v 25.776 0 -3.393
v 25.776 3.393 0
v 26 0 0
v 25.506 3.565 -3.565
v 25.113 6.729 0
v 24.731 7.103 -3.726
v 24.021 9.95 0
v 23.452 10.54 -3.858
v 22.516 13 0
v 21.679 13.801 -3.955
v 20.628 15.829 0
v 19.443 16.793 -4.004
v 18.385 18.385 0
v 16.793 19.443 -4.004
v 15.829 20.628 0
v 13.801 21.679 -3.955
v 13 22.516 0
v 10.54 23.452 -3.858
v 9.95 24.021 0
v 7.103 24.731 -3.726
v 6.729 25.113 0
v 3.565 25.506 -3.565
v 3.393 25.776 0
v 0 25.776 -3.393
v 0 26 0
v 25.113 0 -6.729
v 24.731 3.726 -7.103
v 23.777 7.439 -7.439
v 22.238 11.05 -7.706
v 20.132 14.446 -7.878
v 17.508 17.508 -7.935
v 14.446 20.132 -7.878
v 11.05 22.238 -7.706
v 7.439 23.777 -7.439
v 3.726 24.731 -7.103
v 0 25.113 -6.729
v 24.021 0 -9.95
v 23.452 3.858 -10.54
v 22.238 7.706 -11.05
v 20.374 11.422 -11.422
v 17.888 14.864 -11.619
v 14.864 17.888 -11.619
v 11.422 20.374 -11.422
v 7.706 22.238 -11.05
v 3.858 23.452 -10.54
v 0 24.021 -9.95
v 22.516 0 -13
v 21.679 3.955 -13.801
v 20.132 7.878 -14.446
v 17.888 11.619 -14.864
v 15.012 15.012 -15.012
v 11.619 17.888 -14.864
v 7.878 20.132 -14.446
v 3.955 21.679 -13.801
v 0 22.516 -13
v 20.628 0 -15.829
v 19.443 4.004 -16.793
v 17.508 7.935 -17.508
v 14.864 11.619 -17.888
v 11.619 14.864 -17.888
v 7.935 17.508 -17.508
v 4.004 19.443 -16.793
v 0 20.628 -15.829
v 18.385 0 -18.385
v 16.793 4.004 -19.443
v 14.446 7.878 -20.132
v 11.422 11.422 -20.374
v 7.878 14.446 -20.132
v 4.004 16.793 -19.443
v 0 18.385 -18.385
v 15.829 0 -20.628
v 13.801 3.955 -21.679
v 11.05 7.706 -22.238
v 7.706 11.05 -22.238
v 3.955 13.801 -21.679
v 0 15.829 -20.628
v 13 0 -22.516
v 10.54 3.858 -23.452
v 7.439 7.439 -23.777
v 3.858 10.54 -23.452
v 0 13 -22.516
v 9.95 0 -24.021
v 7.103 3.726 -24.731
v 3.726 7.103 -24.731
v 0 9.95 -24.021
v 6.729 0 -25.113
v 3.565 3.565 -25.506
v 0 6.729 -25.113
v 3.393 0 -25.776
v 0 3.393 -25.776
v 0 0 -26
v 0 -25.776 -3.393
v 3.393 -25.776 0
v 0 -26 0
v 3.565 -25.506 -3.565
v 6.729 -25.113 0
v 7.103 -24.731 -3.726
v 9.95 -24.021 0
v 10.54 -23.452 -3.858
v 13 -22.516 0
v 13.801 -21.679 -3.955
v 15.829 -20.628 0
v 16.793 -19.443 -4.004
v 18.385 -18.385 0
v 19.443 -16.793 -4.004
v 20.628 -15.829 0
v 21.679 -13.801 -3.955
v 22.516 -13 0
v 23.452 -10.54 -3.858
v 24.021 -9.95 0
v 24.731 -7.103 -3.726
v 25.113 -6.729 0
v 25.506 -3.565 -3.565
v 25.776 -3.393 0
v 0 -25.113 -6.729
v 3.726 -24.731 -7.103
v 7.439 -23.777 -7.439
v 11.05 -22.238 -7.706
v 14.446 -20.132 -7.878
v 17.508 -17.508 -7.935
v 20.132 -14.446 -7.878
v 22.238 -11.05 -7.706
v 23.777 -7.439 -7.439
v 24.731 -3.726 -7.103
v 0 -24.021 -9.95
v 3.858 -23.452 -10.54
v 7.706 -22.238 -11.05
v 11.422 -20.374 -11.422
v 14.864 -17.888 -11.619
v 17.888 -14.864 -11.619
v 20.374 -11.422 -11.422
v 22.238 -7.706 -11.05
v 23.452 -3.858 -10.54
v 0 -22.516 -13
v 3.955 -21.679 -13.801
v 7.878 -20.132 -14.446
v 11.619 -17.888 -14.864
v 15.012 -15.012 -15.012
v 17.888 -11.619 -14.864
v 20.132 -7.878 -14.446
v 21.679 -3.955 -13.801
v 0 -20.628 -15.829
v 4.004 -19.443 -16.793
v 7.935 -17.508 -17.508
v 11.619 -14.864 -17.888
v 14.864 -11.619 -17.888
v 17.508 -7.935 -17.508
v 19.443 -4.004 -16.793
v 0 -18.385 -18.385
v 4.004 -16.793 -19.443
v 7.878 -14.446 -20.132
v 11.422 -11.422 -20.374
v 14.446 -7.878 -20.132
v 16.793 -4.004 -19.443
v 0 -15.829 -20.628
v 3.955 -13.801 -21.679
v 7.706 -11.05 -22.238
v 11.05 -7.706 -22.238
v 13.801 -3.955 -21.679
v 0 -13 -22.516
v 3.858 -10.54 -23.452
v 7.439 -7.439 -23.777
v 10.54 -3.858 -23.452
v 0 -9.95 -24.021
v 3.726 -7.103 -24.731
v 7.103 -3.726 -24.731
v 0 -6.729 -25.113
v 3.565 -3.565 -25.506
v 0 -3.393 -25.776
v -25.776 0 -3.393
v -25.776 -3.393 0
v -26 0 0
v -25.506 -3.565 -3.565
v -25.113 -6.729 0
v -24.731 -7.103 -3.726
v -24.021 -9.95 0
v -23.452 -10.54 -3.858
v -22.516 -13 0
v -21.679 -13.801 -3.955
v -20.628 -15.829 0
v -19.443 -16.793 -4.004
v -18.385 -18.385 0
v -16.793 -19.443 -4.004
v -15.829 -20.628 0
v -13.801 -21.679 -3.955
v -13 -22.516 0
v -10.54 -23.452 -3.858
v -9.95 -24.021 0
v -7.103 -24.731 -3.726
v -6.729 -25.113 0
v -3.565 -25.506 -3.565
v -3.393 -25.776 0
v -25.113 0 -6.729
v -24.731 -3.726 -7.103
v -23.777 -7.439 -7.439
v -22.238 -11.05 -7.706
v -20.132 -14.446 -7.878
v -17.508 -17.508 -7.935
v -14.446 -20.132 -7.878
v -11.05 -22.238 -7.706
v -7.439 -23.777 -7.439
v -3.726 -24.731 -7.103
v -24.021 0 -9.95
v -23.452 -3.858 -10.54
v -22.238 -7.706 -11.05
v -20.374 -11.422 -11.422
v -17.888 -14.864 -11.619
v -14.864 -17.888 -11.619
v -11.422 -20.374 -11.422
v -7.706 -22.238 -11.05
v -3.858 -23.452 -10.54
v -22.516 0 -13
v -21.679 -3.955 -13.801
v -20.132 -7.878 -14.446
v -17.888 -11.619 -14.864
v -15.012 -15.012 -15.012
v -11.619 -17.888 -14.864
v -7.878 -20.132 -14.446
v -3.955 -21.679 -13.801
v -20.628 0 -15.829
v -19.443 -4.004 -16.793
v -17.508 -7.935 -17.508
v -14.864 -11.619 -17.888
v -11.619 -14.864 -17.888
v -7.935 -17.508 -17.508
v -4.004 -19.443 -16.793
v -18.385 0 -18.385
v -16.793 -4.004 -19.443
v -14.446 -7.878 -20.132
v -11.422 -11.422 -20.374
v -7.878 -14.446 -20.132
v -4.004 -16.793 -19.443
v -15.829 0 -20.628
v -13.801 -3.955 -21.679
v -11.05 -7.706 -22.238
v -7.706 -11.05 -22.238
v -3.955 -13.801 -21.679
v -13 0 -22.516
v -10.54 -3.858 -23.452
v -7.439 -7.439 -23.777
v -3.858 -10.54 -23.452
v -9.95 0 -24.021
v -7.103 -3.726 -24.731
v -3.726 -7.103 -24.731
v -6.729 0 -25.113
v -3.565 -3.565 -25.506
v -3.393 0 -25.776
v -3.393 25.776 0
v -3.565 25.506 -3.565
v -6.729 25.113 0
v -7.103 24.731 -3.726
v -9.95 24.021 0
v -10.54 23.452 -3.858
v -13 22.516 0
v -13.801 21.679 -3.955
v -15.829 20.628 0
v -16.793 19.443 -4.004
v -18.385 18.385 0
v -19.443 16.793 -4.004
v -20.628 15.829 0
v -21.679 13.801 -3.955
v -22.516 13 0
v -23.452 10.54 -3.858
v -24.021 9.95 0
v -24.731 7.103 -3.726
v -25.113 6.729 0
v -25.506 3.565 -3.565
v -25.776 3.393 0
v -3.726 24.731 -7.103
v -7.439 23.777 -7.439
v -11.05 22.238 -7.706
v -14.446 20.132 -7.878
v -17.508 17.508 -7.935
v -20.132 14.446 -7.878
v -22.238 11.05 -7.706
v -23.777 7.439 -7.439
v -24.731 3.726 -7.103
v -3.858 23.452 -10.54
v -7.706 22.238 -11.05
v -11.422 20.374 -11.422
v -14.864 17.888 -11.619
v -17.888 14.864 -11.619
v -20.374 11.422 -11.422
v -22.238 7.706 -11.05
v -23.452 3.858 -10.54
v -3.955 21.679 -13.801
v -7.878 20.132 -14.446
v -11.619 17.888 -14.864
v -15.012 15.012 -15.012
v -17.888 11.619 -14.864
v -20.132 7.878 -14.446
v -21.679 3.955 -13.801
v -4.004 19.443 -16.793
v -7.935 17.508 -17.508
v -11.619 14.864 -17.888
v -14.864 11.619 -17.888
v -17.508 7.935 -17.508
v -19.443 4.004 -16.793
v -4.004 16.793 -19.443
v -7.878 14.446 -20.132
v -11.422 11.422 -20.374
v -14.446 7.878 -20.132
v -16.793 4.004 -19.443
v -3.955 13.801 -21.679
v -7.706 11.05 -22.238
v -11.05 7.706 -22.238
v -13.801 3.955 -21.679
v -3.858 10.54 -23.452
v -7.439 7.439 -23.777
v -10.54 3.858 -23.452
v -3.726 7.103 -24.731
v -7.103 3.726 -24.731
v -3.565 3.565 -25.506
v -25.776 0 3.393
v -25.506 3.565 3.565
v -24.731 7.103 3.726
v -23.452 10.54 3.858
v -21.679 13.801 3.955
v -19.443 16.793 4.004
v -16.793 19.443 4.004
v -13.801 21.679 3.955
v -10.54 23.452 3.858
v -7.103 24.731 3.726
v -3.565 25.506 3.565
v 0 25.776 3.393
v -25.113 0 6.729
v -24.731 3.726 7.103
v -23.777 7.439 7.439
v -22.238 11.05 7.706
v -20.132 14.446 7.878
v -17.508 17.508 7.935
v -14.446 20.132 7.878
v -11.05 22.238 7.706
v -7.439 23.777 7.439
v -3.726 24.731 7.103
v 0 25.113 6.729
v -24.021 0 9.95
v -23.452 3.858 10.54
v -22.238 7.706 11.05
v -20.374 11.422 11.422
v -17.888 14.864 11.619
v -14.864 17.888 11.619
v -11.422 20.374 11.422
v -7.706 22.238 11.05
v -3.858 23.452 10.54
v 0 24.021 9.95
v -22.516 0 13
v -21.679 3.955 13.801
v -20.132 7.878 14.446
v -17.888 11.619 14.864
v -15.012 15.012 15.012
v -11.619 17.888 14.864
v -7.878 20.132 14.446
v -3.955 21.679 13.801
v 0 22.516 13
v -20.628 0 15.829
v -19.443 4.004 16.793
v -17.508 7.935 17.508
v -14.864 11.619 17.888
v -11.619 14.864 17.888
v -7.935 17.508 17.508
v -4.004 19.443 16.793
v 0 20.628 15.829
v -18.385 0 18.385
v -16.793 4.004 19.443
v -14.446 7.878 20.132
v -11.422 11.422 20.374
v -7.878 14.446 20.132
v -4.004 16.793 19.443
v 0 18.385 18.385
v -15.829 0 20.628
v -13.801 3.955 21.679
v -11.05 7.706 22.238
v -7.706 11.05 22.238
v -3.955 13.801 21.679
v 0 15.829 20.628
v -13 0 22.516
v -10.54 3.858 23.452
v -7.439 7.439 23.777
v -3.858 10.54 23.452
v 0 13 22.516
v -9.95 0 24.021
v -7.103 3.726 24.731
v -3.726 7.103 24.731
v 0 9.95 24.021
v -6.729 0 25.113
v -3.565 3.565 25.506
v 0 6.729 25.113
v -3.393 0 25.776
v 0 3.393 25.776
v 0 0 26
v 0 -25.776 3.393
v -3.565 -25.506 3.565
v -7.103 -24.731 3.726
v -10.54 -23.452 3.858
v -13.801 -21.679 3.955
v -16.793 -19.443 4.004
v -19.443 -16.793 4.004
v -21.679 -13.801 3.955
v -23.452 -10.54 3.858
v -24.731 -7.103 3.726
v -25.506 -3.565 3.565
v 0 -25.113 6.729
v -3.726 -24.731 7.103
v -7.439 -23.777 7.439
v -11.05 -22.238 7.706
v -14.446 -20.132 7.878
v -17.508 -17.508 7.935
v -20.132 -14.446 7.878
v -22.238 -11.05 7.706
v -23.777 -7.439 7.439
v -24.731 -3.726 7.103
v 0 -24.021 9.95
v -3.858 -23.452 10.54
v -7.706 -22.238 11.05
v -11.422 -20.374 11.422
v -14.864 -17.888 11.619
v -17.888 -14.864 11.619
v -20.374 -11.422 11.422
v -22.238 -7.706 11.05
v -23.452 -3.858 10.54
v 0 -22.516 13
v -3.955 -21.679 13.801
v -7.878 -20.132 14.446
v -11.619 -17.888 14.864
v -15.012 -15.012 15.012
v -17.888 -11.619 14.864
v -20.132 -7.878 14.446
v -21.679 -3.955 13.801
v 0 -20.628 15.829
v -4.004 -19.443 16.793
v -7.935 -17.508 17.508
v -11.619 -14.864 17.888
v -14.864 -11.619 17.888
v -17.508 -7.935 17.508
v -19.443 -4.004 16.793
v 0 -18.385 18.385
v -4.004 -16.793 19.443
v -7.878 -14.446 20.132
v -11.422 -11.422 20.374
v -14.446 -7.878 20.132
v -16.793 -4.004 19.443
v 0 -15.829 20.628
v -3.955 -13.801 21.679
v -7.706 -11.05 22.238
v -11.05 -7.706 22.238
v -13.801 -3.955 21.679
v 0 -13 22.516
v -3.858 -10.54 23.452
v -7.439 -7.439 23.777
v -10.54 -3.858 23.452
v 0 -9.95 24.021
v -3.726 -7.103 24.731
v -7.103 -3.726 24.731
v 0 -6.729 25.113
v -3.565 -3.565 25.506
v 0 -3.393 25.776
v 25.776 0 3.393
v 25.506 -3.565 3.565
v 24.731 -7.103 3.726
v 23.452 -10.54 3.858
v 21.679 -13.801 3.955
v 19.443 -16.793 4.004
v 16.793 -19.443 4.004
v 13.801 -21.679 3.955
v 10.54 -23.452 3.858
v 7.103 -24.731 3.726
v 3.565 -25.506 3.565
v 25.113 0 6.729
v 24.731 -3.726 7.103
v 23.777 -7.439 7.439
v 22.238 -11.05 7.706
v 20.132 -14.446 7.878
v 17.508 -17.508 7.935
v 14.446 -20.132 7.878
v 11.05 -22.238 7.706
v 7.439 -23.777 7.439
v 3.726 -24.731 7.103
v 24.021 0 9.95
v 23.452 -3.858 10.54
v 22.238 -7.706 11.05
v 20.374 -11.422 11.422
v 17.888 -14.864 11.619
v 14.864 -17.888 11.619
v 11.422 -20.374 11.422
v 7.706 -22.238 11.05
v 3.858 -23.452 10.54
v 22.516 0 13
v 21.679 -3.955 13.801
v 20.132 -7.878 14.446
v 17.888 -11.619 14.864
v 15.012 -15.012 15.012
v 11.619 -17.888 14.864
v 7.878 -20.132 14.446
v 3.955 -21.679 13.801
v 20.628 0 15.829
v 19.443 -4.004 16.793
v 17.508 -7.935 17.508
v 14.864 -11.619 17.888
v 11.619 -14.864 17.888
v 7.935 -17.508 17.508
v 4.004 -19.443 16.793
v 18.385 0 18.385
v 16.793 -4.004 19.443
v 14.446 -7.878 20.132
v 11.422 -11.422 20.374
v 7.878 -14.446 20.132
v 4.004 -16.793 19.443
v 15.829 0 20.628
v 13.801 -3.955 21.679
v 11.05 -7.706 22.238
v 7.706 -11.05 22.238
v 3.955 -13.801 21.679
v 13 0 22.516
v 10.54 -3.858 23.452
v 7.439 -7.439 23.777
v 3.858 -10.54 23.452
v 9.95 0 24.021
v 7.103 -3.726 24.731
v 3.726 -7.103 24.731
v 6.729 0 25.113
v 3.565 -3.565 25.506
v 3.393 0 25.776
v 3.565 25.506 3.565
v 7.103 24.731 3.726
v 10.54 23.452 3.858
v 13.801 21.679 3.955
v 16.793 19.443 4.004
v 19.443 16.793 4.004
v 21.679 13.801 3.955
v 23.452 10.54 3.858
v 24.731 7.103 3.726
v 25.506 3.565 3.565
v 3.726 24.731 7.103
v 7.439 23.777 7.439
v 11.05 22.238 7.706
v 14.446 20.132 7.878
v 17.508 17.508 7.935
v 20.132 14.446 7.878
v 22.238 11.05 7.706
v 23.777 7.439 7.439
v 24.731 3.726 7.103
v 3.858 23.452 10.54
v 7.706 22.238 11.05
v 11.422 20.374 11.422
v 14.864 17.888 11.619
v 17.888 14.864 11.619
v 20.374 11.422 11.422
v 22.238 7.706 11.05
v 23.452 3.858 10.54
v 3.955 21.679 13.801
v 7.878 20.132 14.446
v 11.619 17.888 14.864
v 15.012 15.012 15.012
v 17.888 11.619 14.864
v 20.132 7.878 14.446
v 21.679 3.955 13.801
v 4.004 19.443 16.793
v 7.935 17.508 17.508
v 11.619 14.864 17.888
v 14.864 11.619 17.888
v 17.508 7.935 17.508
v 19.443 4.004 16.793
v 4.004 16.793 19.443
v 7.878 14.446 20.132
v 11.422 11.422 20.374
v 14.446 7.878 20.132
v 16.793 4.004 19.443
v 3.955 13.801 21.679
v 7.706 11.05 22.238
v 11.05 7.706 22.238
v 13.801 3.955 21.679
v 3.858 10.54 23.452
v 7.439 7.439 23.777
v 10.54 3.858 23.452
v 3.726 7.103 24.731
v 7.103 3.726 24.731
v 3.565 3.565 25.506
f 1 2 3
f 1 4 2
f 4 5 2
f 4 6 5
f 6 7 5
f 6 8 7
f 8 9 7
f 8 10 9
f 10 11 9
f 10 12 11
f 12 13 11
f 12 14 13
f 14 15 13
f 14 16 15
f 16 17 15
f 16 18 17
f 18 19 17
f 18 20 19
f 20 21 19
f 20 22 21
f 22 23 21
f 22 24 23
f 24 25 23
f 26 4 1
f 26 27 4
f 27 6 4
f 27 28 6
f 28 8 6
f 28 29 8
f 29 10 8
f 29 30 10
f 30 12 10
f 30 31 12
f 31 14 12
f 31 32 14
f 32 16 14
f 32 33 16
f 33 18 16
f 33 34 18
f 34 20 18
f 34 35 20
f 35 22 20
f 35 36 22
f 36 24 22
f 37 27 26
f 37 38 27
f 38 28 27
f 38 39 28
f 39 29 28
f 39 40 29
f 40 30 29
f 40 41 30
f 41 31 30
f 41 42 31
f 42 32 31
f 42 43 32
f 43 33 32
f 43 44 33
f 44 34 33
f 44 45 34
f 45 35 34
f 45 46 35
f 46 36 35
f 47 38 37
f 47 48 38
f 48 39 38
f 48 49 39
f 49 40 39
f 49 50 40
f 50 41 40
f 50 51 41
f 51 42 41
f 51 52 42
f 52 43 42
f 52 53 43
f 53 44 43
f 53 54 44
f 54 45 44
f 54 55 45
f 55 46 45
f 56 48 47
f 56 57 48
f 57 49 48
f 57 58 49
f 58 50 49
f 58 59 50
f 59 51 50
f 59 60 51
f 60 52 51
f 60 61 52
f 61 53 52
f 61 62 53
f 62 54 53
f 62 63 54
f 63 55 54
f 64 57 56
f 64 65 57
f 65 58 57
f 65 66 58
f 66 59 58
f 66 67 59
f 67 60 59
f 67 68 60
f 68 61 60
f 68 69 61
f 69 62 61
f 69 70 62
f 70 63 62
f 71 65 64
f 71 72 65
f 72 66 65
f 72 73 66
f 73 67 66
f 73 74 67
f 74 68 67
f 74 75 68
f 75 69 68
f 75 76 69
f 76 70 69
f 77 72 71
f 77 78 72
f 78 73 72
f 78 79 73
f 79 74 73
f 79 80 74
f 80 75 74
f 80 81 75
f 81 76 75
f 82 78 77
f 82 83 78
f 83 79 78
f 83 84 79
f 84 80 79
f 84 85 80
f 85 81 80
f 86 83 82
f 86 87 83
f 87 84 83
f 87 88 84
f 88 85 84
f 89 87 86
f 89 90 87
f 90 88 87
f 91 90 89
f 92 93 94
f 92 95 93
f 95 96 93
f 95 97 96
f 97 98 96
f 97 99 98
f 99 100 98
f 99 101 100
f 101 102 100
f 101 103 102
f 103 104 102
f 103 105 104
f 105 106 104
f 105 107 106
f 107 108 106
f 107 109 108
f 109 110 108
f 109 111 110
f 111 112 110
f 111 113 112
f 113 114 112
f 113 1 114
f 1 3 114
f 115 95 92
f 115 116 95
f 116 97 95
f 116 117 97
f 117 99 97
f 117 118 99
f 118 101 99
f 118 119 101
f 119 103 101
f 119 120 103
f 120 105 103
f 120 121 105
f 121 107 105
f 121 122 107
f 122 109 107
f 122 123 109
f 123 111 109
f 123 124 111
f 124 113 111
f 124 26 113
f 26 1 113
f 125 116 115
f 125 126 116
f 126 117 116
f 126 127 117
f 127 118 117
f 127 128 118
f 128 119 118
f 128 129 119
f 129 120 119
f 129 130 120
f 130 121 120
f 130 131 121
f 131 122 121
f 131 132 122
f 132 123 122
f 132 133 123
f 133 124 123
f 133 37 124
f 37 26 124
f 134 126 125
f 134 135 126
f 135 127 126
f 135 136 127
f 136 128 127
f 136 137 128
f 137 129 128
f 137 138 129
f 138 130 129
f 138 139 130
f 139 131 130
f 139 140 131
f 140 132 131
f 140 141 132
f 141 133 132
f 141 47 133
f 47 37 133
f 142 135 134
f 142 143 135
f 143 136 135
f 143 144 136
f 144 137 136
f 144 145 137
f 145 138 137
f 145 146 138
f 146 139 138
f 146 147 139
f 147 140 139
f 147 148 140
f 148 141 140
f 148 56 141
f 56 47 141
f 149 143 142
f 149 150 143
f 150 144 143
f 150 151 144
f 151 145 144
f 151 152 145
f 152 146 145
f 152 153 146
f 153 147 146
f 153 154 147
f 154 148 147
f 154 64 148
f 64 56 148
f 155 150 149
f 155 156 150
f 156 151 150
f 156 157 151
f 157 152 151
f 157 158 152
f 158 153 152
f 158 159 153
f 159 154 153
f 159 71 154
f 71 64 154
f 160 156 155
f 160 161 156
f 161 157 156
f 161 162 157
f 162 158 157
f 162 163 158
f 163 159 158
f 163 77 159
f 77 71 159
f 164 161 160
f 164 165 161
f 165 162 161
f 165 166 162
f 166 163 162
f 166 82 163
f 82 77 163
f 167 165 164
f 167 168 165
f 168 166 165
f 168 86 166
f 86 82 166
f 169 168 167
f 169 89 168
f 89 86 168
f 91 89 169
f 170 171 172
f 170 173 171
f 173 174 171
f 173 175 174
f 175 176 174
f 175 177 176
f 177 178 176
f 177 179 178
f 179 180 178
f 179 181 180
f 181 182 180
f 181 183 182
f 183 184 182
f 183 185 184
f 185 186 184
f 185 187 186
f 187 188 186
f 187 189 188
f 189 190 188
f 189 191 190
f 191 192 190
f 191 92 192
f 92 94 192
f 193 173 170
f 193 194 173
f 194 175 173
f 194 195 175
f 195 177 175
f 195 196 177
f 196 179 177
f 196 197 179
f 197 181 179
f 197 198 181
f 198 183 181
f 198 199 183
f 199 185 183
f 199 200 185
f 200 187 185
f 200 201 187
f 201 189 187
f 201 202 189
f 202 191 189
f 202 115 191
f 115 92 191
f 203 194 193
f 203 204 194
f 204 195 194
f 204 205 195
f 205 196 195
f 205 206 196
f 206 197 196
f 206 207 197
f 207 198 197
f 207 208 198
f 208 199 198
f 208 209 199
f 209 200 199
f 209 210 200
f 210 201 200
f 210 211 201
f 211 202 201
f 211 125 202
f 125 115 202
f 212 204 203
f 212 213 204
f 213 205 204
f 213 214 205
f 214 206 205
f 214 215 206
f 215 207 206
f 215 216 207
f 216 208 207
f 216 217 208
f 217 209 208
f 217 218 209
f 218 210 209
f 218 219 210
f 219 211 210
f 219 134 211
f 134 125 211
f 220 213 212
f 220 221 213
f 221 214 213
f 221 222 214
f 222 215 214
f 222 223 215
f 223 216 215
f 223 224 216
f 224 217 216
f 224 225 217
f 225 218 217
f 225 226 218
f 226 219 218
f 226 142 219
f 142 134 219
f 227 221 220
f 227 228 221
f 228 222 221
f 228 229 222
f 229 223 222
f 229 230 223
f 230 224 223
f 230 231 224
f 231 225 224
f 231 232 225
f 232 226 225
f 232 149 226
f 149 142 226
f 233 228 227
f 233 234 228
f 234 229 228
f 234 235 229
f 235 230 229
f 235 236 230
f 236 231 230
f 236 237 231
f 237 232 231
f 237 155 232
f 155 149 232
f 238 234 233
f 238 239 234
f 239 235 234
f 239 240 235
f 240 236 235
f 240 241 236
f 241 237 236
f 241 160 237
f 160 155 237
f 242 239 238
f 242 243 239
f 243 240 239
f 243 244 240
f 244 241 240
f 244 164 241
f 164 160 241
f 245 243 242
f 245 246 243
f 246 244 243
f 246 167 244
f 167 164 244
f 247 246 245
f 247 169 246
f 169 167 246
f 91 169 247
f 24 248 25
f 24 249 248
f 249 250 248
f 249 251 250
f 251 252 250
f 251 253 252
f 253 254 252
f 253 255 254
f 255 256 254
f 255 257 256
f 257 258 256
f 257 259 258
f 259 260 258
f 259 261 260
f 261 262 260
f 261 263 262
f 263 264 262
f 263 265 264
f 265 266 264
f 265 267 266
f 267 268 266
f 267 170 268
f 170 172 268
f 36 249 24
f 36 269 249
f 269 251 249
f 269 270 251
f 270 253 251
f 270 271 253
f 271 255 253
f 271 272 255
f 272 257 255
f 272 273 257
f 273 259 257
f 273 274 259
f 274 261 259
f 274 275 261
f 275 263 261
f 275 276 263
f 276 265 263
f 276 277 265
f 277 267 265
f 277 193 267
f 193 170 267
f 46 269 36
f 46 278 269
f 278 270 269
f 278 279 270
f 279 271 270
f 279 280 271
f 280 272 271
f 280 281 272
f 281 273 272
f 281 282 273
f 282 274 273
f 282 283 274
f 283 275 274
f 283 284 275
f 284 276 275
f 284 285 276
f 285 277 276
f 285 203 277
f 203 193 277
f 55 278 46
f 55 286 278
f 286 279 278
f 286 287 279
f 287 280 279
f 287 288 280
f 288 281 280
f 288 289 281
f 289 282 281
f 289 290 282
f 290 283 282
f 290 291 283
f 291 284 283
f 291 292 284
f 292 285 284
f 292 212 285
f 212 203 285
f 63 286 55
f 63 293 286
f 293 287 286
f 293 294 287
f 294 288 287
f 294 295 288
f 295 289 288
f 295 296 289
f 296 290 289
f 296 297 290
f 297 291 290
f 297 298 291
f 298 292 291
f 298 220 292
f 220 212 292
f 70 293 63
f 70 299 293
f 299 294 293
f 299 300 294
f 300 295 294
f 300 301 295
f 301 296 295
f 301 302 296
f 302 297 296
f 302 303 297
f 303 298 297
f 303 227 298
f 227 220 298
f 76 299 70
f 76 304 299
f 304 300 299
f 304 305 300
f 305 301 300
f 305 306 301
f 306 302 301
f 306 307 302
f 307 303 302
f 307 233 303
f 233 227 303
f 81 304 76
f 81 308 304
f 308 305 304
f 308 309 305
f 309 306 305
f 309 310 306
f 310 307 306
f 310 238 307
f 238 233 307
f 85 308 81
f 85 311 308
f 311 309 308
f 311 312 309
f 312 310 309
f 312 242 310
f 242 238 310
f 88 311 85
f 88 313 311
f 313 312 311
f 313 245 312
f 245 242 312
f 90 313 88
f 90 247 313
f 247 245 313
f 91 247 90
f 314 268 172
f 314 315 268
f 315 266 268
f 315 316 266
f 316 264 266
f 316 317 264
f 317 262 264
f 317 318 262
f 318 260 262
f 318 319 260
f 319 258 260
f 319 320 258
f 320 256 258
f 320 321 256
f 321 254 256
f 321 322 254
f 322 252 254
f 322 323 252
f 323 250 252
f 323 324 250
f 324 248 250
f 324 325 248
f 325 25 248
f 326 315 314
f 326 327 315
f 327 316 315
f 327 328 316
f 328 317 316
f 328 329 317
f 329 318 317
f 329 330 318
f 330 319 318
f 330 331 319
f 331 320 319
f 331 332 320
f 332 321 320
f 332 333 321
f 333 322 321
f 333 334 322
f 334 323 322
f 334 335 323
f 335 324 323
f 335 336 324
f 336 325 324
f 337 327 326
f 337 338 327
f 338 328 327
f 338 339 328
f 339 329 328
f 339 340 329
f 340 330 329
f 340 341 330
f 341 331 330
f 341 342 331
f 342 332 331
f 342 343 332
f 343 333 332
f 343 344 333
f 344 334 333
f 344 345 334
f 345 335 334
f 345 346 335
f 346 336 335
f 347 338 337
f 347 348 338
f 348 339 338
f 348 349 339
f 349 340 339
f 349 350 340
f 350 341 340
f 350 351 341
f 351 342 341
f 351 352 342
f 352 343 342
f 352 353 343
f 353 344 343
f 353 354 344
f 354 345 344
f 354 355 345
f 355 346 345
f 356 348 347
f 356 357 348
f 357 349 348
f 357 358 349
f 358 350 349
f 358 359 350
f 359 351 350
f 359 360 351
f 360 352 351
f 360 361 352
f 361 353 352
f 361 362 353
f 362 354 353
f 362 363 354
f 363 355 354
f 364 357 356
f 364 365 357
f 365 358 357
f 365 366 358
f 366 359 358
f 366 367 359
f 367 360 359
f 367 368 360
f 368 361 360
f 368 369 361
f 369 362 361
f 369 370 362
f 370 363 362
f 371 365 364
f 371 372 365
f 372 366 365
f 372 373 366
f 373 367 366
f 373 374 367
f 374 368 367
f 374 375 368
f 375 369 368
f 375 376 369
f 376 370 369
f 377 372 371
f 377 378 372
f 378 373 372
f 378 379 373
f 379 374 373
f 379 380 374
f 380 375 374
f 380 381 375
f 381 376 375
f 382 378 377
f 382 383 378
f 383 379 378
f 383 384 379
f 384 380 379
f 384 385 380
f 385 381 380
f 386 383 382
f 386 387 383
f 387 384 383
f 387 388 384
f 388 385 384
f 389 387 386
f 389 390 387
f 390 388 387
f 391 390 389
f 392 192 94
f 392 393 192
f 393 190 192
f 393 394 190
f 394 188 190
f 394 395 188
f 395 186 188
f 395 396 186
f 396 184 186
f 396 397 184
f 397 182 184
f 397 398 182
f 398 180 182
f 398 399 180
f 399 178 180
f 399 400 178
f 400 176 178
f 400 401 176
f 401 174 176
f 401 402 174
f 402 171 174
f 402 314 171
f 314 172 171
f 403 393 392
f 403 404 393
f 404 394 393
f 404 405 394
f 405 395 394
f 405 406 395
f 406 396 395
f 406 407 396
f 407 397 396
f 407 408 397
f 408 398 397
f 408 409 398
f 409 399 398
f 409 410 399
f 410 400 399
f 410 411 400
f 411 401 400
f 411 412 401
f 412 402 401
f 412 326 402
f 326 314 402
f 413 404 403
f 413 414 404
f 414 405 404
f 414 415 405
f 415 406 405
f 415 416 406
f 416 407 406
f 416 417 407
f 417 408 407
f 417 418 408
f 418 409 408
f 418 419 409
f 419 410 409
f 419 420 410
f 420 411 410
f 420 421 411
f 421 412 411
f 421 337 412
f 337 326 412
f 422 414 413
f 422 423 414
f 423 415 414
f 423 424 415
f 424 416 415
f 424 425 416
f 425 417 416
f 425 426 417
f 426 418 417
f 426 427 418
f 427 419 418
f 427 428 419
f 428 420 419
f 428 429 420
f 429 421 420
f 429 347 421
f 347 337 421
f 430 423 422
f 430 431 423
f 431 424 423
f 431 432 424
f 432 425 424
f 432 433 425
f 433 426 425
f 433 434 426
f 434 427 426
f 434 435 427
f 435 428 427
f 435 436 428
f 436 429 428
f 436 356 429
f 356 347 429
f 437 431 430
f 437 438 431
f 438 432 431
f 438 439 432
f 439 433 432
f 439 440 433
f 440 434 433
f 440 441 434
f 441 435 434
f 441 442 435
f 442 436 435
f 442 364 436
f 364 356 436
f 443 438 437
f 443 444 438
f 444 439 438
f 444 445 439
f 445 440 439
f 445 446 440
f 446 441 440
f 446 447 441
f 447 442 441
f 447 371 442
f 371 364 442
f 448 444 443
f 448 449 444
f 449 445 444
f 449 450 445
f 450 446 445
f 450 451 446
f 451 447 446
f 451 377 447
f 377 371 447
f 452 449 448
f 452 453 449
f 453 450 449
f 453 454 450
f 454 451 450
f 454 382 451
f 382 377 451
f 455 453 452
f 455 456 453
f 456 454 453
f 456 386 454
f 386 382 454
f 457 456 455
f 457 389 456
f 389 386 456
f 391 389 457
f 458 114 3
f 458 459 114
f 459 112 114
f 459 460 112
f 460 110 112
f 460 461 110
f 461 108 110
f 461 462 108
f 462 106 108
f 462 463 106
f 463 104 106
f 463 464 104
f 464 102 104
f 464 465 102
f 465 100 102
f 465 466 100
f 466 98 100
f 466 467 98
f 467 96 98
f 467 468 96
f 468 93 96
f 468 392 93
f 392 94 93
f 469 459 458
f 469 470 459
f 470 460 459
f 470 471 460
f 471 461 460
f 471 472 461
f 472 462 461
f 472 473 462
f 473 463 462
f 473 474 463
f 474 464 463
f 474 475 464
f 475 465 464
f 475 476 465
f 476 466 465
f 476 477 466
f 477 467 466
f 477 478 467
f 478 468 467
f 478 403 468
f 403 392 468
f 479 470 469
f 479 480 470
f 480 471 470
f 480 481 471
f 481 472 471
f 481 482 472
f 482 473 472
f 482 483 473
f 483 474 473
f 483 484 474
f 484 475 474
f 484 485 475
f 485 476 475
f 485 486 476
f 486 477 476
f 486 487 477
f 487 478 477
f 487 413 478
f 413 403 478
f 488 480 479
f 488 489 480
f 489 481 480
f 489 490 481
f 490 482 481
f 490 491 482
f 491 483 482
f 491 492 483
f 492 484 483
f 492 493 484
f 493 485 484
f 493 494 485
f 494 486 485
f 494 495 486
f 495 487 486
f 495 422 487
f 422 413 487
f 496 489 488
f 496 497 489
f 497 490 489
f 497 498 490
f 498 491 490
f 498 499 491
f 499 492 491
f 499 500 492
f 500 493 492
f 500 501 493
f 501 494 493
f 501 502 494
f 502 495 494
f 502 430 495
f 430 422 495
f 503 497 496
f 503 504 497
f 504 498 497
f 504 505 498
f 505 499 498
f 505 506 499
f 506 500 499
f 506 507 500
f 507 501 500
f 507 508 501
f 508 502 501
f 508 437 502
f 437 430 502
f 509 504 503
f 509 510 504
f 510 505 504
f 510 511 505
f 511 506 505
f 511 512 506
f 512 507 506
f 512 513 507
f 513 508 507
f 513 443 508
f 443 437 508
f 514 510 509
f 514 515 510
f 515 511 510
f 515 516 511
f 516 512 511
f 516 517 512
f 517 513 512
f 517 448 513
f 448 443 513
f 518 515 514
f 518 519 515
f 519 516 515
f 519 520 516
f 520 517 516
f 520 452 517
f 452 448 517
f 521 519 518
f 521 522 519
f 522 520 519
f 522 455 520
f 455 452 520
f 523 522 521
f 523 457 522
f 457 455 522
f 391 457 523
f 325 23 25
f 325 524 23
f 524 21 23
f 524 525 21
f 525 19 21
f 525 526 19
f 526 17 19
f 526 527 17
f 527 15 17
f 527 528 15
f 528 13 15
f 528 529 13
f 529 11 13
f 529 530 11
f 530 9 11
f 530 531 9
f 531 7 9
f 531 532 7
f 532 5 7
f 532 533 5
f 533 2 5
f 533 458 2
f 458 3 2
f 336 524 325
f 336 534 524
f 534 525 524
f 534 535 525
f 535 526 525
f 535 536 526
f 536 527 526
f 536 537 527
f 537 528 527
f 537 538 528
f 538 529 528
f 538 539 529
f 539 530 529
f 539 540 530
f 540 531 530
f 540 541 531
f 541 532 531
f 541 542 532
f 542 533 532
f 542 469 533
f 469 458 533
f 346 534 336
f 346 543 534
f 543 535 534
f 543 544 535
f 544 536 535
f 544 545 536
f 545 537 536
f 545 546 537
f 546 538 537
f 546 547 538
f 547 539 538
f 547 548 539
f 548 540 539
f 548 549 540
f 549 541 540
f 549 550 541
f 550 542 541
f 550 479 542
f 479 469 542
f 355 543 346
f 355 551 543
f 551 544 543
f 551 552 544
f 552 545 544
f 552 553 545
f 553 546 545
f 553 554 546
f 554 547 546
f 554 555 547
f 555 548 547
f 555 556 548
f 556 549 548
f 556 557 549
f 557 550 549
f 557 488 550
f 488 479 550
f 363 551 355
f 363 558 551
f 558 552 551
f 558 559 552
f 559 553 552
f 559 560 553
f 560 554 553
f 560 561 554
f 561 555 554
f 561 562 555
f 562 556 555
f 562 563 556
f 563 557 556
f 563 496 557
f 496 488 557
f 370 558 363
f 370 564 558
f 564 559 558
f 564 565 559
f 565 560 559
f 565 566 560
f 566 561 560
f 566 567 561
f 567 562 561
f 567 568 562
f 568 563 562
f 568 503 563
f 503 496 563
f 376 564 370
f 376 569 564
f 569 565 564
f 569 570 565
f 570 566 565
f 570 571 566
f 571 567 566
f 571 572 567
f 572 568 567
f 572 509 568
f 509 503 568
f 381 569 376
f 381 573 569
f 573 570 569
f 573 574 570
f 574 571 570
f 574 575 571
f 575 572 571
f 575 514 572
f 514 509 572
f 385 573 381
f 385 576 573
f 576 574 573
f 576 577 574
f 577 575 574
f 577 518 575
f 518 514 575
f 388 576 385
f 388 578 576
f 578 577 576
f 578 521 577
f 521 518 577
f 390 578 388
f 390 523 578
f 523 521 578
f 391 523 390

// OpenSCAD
// file: ../p/48/8-8sphe.scad
use <../../lib.scad>
use <1-8sphe.scad>
function ldraw_lib__48__8_8sphe() = [
// 0 Hi-Res Sphere 1.0
// 0 Name: 48\8-8sphe.dat
// 0 Author: Steve Bliss [sbliss]
// 0 !LDRAW_ORG 48_Primitive UPDATE 2012-01
// 0 !LICENSE Licensed under CC BY 2.0 and CC BY 4.0 : see CAreadme.txt
// 
// 0 BFC CERTIFY CCW
  [0,"BFC","CERTIFY"],
  [0,"BFC","CCW"],
// 
// 0 !HISTORY 2012-03-30 [PTadmin] Official Update 2012-01
// 
// 
// 1 16 0 0 0 1 0 0 0 1 0 0 0 1 48\1-8sphe.dat
  [1,16,0,0,0,1,0,0,0,1,0,0,0,1, ldraw_lib__48__1_8sphe()],
// 1 16 0 0 0 0 0 1 0 1 0 -1 0 0 48\1-8sphe.dat
  [1,16,0,0,0,0,0,1,0,1,0,-1,0,0, ldraw_lib__48__1_8sphe()],
// 1 16 0 0 0 -1 0 0 0 1 0 0 0 -1 48\1-8sphe.dat
  [1,16,0,0,0,-1,0,0,0,1,0,0,0,-1, ldraw_lib__48__1_8sphe()],
// 1 16 0 0 0 0 0 -1 0 1 0 1 0 0 48\1-8sphe.dat
  [1,16,0,0,0,0,0,-1,0,1,0,1,0,0, ldraw_lib__48__1_8sphe()],
// 1 16 0 0 0 -1 0 0 0 -1 0 0 0 1 48\1-8sphe.dat
  [1,16,0,0,0,-1,0,0,0,-1,0,0,0,1, ldraw_lib__48__1_8sphe()],
// 1 16 0 0 0 0 0 -1 0 -1 0 -1 0 0 48\1-8sphe.dat
  [1,16,0,0,0,0,0,-1,0,-1,0,-1,0,0, ldraw_lib__48__1_8sphe()],
// 1 16 0 0 0 1 0 0 0 -1 0 0 0 -1 48\1-8sphe.dat
  [1,16,0,0,0,1,0,0,0,-1,0,0,0,-1, ldraw_lib__48__1_8sphe()],
// 1 16 0 0 0 0 0 1 0 -1 0 1 0 0 48\1-8sphe.dat
  [1,16,0,0,0,0,0,1,0,-1,0,1,0,0, ldraw_lib__48__1_8sphe()],
// 0
];
module ldraw_lib__48__8_8sphe(step=0, col=false, unit=2/5, alt=false, line=0.2, solid=!$preview)
    makepoly(ldraw_lib__48__8_8sphe(), step=step, col=col, unit=unit, alt=alt, line=line, solid=solid);
ldraw_lib__48__8_8sphe(line=0.2);
// file: 22119.scad
use <../lib.scad>
use <../p/48/8-8sphe.scad>
function ldraw_lib__22119() = [
// 0 Ball 52mm Diameter
// 0 Name: 22119.dat
// 0 Author: Philippe Hurbain [Philo]
// 0 !LDRAW_ORG Part UPDATE 2012-01
// 0 !LICENSE Licensed under CC BY 2.0 and CC BY 4.0 : see CAreadme.txt
// 
// 0 BFC CERTIFY CCW
  [0,"BFC","CERTIFY"],
  [0,"BFC","CCW"],
// 
// 0 !CATEGORY Sphere
// 
// 0 !HISTORY 2012-03-30 [PTadmin] Official Update 2012-01
// 
// 
// 1 16 0 0 0 65 0 0 0 65 0 0 0 65 48\8-8sphe.dat
  [1,16,0,0,0,65,0,0,0,65,0,0,0,65, ldraw_lib__48__8_8sphe()],
// 0
];
module ldraw_lib__22119(step=0, col=false, unit=2/5, alt=false, line=0.2, solid=!$preview)
    makepoly(ldraw_lib__22119(), step=step, col=col, unit=unit, alt=alt, line=line, solid=solid);
ldraw_lib__22119(line=0.2);
// main file
use <../lib.scad>
use <22119.scad>
function ldraw_lib__23065() = [
// 0 ~_Ball 52mm Diameter Dark Grey (Obsolete)
// 0 Name: 23065.dat
// 0 Author: [PTadmin]
// 0 !LDRAW_ORG Part Physical_Colour UPDATE 2022-01
// 0 !LICENSE Licensed under CC BY 4.0 : see CAreadme.txt
// 
// 0 BFC CERTIFY CW
  [0,"BFC","CERTIFY"],
  [0,"BFC","CW"],
// 
// 0 !CATEGORY Sphere
// 
// 0 !HISTORY 2012-03-30 [PTadmin] Official Update 2012-01
// 0 !HISTORY 2019-05-24 [cwdee] Obsoleted per decision not to include physical colour parts
// 0 !HISTORY 2019-09-09 [PTadmin] Official Update 2019-02
// 0 !HISTORY 2021-01-16 [cwdee] Update description
// 0 !HISTORY 2022-01-14 [PTadmin] Official Update 2022-01
// 
// 
// 0 // This file is a "shortcut" with the correct number for the actual
// 0 // colouring of the part (Dark Gray).
// 
// 1 8 0 0 0 1 0 0 0 1 0 0 0 1 22119.dat
  [1,8,0,0,0,1,0,0,0,1,0,0,0,1, ldraw_lib__22119()],
// 0
];
module ldraw_lib__23065(step=0, col=false, unit=2/5, alt=false, line=0.2, solid=!$preview)
    makepoly(ldraw_lib__23065(), step=step, col=col, unit=unit, alt=alt, line=line, solid=solid);
ldraw_lib__23065(line=0.2);
